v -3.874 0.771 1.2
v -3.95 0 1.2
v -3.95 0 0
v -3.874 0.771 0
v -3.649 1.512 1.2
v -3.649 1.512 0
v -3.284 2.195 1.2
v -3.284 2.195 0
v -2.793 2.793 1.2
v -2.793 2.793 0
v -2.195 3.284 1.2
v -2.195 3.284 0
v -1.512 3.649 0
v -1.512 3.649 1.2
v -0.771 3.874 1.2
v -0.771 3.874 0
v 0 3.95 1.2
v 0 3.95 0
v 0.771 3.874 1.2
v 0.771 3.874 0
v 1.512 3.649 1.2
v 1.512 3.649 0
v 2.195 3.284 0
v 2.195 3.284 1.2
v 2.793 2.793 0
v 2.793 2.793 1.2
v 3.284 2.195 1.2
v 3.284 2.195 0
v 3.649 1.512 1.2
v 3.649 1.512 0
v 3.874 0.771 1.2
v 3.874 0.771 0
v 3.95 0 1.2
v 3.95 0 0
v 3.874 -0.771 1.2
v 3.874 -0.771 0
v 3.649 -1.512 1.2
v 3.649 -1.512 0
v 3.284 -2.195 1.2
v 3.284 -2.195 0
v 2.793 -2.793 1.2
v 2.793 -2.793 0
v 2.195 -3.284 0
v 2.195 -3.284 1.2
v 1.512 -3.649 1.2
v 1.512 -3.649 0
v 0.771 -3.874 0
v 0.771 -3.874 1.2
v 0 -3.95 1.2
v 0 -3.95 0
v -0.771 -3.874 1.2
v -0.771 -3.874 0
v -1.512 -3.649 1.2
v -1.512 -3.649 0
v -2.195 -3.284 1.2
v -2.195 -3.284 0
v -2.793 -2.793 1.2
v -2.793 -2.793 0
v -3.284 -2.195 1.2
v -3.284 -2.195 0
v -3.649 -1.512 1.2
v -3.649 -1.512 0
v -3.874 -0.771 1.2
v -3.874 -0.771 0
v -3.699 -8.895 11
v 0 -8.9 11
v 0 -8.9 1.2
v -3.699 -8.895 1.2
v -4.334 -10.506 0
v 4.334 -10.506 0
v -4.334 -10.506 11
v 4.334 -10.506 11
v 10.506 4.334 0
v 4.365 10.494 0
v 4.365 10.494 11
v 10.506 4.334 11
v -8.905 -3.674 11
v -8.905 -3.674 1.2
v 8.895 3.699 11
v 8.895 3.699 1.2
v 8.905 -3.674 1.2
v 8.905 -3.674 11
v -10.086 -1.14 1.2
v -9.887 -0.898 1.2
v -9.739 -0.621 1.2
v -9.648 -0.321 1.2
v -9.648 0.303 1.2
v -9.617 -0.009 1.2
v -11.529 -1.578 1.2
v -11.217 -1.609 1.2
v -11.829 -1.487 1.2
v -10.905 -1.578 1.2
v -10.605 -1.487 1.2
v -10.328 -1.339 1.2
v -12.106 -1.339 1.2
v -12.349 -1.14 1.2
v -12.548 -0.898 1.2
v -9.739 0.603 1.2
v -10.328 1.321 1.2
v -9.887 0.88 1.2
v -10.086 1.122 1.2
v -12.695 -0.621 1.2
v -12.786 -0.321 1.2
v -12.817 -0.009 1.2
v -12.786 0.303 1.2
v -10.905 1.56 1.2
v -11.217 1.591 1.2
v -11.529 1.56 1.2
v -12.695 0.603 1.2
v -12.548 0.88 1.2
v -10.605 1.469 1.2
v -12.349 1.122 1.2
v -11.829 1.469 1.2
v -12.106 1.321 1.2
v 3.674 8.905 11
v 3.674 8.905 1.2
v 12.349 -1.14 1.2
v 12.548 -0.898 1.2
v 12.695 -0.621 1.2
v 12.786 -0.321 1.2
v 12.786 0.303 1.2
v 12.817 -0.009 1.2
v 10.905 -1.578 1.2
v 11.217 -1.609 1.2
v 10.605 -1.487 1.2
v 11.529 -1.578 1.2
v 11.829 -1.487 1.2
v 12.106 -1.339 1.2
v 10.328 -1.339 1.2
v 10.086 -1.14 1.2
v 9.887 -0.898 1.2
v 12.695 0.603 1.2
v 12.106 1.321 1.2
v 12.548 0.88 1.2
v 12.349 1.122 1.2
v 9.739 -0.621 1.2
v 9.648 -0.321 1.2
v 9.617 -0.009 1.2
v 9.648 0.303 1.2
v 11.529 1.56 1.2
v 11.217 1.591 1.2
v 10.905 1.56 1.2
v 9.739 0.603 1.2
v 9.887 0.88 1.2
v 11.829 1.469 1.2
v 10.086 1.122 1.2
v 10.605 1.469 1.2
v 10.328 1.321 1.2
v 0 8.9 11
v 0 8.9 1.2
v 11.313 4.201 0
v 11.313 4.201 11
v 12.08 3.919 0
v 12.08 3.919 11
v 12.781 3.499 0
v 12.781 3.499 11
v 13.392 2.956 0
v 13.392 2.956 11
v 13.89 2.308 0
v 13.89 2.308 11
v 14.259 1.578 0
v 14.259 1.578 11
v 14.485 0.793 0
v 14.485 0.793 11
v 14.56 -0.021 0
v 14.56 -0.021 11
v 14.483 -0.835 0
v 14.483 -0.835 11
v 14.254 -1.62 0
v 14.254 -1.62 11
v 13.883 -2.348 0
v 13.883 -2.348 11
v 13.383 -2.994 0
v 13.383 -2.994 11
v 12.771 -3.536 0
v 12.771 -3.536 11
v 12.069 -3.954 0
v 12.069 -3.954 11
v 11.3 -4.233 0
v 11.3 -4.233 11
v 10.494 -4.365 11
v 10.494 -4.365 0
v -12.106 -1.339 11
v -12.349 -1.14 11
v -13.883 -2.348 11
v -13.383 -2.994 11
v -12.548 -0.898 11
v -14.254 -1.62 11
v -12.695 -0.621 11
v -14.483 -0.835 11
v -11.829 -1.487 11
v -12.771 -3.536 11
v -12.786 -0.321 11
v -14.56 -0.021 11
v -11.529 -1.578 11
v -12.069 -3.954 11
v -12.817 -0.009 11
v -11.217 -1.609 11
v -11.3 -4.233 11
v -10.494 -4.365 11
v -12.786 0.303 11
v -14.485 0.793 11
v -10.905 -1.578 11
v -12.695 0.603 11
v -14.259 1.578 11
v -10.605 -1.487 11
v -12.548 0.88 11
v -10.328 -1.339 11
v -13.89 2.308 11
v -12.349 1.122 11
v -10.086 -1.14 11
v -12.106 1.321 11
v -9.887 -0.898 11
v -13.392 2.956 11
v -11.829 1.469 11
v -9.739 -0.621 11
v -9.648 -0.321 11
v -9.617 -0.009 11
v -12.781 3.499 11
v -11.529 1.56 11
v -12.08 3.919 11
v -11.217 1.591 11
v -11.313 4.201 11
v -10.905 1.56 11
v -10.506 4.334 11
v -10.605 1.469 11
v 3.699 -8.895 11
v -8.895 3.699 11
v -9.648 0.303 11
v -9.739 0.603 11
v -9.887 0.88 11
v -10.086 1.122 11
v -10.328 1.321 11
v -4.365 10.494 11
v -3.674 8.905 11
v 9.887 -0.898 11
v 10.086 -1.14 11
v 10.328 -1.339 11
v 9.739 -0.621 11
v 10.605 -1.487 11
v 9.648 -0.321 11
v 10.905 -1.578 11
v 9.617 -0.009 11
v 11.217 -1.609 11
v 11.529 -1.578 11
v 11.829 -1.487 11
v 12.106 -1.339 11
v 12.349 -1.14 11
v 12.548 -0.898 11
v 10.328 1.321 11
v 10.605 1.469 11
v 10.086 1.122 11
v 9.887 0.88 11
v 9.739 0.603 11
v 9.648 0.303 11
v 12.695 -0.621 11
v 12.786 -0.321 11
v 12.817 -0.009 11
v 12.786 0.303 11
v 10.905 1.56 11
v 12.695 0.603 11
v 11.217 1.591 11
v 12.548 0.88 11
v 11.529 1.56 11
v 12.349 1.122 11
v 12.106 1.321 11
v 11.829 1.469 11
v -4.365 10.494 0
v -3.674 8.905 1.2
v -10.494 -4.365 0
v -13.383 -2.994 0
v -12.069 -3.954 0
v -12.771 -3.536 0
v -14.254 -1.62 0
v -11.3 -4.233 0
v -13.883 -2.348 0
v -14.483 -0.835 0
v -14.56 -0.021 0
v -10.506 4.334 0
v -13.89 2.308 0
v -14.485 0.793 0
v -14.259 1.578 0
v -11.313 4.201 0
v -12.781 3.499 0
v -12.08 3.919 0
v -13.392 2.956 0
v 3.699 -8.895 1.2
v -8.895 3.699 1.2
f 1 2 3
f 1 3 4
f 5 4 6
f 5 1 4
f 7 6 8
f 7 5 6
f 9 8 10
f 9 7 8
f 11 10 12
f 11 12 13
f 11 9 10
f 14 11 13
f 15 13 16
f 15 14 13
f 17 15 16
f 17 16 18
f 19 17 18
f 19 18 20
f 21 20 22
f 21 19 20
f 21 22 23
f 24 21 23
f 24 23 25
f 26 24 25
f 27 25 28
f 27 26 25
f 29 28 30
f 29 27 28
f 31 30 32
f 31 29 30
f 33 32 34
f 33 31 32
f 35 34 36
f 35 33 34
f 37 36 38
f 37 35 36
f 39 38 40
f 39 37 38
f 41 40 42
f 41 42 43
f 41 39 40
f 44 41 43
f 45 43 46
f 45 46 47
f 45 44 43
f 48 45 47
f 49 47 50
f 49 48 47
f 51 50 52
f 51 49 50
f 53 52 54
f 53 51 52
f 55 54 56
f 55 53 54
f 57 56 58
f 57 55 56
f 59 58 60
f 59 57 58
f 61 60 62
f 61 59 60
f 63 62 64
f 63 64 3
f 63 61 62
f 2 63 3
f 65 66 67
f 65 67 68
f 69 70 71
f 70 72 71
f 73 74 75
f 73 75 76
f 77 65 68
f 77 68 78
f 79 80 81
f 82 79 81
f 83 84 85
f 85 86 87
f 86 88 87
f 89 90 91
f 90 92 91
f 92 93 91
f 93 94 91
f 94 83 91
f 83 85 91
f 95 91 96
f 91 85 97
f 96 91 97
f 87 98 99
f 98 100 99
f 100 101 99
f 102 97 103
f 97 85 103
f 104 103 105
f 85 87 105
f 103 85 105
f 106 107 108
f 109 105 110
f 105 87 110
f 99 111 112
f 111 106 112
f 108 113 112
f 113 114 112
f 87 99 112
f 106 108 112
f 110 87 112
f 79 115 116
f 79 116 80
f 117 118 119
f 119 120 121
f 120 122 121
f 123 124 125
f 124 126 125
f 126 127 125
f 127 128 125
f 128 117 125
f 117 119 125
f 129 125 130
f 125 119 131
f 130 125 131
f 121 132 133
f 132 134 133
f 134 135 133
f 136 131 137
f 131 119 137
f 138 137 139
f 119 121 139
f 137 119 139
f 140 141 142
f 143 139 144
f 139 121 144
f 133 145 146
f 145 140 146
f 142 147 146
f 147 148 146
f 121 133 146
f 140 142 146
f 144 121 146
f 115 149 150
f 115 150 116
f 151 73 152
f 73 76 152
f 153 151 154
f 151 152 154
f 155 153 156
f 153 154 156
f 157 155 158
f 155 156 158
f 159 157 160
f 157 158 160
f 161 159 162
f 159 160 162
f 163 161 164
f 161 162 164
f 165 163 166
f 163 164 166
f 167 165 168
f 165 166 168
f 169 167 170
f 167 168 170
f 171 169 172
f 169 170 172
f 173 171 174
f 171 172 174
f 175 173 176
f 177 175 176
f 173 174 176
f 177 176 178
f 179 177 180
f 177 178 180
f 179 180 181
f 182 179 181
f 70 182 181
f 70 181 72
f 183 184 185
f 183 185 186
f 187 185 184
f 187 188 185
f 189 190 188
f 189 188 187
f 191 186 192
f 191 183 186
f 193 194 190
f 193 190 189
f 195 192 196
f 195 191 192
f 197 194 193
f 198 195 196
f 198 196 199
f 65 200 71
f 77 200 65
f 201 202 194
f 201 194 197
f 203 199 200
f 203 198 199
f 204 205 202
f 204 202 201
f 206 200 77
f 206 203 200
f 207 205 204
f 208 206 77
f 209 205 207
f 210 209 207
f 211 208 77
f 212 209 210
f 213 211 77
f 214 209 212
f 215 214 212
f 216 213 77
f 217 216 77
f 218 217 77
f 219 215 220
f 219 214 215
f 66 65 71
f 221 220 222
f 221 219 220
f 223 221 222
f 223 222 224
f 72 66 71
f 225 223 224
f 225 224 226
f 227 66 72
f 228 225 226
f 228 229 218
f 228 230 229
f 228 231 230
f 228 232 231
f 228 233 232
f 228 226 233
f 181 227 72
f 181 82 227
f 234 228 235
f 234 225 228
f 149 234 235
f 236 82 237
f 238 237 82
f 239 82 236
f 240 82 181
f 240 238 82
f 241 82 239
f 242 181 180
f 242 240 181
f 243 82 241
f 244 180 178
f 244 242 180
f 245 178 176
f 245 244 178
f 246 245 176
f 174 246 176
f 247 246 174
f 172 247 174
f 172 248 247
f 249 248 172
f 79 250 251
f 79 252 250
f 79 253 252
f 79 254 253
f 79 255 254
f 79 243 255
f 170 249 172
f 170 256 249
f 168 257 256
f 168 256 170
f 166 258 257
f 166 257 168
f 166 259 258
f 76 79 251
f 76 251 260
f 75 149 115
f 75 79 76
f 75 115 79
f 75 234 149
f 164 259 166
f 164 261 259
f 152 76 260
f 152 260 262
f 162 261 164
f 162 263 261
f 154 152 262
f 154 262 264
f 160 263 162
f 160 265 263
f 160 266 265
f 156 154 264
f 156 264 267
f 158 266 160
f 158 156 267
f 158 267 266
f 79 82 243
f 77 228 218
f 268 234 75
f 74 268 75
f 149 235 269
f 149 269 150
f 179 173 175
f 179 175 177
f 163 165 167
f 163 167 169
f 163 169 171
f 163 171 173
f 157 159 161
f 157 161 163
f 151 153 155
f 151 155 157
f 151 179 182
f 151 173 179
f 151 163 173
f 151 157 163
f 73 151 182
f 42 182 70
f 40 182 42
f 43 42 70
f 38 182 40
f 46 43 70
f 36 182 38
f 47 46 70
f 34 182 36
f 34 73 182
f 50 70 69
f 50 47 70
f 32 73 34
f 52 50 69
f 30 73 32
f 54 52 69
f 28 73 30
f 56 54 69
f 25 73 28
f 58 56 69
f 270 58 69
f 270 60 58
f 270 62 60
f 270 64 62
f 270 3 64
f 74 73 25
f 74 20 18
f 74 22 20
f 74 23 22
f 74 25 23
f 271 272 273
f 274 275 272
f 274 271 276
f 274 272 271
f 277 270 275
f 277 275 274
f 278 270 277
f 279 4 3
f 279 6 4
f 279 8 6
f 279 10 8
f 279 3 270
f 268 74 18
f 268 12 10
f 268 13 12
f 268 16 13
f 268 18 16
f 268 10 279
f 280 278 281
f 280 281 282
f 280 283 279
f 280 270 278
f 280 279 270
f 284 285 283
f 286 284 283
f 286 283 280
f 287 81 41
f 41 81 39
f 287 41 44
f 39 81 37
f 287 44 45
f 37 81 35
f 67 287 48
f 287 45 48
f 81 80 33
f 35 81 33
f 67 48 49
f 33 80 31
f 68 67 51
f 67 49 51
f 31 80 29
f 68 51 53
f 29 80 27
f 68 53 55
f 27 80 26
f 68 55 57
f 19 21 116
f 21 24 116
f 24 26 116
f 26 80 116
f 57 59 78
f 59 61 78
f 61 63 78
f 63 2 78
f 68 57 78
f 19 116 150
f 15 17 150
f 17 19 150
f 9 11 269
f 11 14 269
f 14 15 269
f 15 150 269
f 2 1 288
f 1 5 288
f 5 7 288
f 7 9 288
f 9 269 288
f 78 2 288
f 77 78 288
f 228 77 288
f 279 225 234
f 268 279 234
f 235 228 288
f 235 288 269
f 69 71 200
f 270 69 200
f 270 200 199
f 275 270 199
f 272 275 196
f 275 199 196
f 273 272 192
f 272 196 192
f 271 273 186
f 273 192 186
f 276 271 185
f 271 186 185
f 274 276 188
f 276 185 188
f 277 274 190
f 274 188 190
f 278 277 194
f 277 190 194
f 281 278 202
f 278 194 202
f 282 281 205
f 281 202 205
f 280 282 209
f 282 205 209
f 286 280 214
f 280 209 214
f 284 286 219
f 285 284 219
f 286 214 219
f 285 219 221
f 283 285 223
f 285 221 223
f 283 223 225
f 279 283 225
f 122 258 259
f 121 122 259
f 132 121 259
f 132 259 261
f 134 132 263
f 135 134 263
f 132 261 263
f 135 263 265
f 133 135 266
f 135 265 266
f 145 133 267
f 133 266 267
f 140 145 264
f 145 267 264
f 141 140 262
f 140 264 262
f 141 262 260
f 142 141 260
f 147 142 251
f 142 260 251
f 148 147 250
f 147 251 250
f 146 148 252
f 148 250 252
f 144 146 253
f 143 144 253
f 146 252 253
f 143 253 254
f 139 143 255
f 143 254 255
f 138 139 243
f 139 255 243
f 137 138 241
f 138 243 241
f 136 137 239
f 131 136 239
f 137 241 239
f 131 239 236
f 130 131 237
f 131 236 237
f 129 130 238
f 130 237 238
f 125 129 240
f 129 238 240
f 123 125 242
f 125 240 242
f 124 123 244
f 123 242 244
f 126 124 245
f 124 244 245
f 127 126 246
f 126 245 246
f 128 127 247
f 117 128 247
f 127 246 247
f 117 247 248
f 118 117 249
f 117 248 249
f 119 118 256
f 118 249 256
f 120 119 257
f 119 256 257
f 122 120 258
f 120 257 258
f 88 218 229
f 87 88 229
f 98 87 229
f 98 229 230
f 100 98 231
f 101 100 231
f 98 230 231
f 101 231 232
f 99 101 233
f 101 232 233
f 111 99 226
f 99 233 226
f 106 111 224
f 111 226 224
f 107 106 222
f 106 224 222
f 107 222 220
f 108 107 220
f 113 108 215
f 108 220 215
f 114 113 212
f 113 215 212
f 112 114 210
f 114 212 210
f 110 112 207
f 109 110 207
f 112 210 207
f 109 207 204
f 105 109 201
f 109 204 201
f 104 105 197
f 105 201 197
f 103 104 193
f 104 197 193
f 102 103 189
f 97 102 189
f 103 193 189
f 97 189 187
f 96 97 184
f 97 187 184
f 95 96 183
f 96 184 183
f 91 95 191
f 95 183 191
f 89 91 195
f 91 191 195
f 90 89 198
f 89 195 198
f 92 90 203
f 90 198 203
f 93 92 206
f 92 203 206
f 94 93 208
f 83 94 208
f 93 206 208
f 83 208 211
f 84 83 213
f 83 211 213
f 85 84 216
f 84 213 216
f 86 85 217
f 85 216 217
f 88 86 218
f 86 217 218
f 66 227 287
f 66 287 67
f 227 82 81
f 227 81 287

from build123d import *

# Parameters (mm, degrees)
SKETCH1_R           = 1.600000124
BOSS_EXTRUDE1_DEPTH = 9.8
SKETCH2_R           = 3.949999995
BOSS_EXTRUDE2_DEPTH = 1.2


with BuildPart() as part:
    # Sketch1 → Boss-Extrude1 (new body)
    with BuildSketch(Plane.XY.offset(11)):
        with BuildLine():
            Line((4.333958961, -10.506317019), (10.493660346, -4.364516586))
            ThreePointArc((10.493660346, -4.364516586), (14.560364187, -0.021186842), (10.506317019, 4.333958961))
            Line((10.506317019, 4.333958961), (4.364516586, 10.493660346))
            Line((4.364516586, 10.493660346), (-4.364516586, 10.493660346))
            Line((-4.364516586, 10.493660346), (-10.506317019, 4.333958961))
            ThreePointArc((-10.506317019, 4.333958961), (-14.560364187, -0.021186842), (-10.493660346, -4.364516586))
            Line((-10.493660346, -4.364516586), (-4.333958961, -10.506317019))
            Line((-4.333958961, -10.506317019), (4.333958961, -10.506317019))
        make_face()
        with Locations((11.217179708, -0.008876194)):
            Circle(SKETCH1_R, mode=Mode.SUBTRACT)
        with Locations((-11.217179708, -0.008876194)):
            Circle(SKETCH1_R, mode=Mode.SUBTRACT)
        Polygon((0, 8.900009778), (3.673546249, 8.905354887), (8.894626983, 3.699447494), (8.905354887, -3.673546249), (3.699447494, -8.894626983), (0, -8.900009778), (-3.699447494, -8.894626983), (-8.905354887, -3.673546249), (-8.894626983, 3.699447494), (-3.673546249, 8.905354887), align=None, mode=Mode.SUBTRACT)
    extrude(amount=-BOSS_EXTRUDE1_DEPTH)

    # Sketch2 → Boss-Extrude2 (add)
    with BuildSketch(Plane(origin=(0, 0, 1.2), x_dir=(-1, 0, 0), z_dir=(0, 0, -1))):
        with BuildLine():
            Line((4.364516586, 10.493660346), (-4.364516586, 10.493660346))
            Line((-4.364516586, 10.493660346), (-10.506317019, 4.333958961))
            ThreePointArc((-10.506317019, 4.333958961), (-14.560364187, -0.021186842), (-10.493660346, -4.364516586))
            Line((-10.493660346, -4.364516586), (-4.333958961, -10.506317019))
            Line((-4.333958961, -10.506317019), (4.333958961, -10.506317019))
            Line((4.333958961, -10.506317019), (10.493660346, -4.364516586))
            ThreePointArc((10.493660346, -4.364516586), (14.560364187, -0.021186842), (10.506317019, 4.333958961))
            Line((10.506317019, 4.333958961), (4.364516586, 10.493660346))
        make_face()
        Circle(SKETCH2_R, mode=Mode.SUBTRACT)
    extrude(amount=BOSS_EXTRUDE2_DEPTH)


solid = part.part
